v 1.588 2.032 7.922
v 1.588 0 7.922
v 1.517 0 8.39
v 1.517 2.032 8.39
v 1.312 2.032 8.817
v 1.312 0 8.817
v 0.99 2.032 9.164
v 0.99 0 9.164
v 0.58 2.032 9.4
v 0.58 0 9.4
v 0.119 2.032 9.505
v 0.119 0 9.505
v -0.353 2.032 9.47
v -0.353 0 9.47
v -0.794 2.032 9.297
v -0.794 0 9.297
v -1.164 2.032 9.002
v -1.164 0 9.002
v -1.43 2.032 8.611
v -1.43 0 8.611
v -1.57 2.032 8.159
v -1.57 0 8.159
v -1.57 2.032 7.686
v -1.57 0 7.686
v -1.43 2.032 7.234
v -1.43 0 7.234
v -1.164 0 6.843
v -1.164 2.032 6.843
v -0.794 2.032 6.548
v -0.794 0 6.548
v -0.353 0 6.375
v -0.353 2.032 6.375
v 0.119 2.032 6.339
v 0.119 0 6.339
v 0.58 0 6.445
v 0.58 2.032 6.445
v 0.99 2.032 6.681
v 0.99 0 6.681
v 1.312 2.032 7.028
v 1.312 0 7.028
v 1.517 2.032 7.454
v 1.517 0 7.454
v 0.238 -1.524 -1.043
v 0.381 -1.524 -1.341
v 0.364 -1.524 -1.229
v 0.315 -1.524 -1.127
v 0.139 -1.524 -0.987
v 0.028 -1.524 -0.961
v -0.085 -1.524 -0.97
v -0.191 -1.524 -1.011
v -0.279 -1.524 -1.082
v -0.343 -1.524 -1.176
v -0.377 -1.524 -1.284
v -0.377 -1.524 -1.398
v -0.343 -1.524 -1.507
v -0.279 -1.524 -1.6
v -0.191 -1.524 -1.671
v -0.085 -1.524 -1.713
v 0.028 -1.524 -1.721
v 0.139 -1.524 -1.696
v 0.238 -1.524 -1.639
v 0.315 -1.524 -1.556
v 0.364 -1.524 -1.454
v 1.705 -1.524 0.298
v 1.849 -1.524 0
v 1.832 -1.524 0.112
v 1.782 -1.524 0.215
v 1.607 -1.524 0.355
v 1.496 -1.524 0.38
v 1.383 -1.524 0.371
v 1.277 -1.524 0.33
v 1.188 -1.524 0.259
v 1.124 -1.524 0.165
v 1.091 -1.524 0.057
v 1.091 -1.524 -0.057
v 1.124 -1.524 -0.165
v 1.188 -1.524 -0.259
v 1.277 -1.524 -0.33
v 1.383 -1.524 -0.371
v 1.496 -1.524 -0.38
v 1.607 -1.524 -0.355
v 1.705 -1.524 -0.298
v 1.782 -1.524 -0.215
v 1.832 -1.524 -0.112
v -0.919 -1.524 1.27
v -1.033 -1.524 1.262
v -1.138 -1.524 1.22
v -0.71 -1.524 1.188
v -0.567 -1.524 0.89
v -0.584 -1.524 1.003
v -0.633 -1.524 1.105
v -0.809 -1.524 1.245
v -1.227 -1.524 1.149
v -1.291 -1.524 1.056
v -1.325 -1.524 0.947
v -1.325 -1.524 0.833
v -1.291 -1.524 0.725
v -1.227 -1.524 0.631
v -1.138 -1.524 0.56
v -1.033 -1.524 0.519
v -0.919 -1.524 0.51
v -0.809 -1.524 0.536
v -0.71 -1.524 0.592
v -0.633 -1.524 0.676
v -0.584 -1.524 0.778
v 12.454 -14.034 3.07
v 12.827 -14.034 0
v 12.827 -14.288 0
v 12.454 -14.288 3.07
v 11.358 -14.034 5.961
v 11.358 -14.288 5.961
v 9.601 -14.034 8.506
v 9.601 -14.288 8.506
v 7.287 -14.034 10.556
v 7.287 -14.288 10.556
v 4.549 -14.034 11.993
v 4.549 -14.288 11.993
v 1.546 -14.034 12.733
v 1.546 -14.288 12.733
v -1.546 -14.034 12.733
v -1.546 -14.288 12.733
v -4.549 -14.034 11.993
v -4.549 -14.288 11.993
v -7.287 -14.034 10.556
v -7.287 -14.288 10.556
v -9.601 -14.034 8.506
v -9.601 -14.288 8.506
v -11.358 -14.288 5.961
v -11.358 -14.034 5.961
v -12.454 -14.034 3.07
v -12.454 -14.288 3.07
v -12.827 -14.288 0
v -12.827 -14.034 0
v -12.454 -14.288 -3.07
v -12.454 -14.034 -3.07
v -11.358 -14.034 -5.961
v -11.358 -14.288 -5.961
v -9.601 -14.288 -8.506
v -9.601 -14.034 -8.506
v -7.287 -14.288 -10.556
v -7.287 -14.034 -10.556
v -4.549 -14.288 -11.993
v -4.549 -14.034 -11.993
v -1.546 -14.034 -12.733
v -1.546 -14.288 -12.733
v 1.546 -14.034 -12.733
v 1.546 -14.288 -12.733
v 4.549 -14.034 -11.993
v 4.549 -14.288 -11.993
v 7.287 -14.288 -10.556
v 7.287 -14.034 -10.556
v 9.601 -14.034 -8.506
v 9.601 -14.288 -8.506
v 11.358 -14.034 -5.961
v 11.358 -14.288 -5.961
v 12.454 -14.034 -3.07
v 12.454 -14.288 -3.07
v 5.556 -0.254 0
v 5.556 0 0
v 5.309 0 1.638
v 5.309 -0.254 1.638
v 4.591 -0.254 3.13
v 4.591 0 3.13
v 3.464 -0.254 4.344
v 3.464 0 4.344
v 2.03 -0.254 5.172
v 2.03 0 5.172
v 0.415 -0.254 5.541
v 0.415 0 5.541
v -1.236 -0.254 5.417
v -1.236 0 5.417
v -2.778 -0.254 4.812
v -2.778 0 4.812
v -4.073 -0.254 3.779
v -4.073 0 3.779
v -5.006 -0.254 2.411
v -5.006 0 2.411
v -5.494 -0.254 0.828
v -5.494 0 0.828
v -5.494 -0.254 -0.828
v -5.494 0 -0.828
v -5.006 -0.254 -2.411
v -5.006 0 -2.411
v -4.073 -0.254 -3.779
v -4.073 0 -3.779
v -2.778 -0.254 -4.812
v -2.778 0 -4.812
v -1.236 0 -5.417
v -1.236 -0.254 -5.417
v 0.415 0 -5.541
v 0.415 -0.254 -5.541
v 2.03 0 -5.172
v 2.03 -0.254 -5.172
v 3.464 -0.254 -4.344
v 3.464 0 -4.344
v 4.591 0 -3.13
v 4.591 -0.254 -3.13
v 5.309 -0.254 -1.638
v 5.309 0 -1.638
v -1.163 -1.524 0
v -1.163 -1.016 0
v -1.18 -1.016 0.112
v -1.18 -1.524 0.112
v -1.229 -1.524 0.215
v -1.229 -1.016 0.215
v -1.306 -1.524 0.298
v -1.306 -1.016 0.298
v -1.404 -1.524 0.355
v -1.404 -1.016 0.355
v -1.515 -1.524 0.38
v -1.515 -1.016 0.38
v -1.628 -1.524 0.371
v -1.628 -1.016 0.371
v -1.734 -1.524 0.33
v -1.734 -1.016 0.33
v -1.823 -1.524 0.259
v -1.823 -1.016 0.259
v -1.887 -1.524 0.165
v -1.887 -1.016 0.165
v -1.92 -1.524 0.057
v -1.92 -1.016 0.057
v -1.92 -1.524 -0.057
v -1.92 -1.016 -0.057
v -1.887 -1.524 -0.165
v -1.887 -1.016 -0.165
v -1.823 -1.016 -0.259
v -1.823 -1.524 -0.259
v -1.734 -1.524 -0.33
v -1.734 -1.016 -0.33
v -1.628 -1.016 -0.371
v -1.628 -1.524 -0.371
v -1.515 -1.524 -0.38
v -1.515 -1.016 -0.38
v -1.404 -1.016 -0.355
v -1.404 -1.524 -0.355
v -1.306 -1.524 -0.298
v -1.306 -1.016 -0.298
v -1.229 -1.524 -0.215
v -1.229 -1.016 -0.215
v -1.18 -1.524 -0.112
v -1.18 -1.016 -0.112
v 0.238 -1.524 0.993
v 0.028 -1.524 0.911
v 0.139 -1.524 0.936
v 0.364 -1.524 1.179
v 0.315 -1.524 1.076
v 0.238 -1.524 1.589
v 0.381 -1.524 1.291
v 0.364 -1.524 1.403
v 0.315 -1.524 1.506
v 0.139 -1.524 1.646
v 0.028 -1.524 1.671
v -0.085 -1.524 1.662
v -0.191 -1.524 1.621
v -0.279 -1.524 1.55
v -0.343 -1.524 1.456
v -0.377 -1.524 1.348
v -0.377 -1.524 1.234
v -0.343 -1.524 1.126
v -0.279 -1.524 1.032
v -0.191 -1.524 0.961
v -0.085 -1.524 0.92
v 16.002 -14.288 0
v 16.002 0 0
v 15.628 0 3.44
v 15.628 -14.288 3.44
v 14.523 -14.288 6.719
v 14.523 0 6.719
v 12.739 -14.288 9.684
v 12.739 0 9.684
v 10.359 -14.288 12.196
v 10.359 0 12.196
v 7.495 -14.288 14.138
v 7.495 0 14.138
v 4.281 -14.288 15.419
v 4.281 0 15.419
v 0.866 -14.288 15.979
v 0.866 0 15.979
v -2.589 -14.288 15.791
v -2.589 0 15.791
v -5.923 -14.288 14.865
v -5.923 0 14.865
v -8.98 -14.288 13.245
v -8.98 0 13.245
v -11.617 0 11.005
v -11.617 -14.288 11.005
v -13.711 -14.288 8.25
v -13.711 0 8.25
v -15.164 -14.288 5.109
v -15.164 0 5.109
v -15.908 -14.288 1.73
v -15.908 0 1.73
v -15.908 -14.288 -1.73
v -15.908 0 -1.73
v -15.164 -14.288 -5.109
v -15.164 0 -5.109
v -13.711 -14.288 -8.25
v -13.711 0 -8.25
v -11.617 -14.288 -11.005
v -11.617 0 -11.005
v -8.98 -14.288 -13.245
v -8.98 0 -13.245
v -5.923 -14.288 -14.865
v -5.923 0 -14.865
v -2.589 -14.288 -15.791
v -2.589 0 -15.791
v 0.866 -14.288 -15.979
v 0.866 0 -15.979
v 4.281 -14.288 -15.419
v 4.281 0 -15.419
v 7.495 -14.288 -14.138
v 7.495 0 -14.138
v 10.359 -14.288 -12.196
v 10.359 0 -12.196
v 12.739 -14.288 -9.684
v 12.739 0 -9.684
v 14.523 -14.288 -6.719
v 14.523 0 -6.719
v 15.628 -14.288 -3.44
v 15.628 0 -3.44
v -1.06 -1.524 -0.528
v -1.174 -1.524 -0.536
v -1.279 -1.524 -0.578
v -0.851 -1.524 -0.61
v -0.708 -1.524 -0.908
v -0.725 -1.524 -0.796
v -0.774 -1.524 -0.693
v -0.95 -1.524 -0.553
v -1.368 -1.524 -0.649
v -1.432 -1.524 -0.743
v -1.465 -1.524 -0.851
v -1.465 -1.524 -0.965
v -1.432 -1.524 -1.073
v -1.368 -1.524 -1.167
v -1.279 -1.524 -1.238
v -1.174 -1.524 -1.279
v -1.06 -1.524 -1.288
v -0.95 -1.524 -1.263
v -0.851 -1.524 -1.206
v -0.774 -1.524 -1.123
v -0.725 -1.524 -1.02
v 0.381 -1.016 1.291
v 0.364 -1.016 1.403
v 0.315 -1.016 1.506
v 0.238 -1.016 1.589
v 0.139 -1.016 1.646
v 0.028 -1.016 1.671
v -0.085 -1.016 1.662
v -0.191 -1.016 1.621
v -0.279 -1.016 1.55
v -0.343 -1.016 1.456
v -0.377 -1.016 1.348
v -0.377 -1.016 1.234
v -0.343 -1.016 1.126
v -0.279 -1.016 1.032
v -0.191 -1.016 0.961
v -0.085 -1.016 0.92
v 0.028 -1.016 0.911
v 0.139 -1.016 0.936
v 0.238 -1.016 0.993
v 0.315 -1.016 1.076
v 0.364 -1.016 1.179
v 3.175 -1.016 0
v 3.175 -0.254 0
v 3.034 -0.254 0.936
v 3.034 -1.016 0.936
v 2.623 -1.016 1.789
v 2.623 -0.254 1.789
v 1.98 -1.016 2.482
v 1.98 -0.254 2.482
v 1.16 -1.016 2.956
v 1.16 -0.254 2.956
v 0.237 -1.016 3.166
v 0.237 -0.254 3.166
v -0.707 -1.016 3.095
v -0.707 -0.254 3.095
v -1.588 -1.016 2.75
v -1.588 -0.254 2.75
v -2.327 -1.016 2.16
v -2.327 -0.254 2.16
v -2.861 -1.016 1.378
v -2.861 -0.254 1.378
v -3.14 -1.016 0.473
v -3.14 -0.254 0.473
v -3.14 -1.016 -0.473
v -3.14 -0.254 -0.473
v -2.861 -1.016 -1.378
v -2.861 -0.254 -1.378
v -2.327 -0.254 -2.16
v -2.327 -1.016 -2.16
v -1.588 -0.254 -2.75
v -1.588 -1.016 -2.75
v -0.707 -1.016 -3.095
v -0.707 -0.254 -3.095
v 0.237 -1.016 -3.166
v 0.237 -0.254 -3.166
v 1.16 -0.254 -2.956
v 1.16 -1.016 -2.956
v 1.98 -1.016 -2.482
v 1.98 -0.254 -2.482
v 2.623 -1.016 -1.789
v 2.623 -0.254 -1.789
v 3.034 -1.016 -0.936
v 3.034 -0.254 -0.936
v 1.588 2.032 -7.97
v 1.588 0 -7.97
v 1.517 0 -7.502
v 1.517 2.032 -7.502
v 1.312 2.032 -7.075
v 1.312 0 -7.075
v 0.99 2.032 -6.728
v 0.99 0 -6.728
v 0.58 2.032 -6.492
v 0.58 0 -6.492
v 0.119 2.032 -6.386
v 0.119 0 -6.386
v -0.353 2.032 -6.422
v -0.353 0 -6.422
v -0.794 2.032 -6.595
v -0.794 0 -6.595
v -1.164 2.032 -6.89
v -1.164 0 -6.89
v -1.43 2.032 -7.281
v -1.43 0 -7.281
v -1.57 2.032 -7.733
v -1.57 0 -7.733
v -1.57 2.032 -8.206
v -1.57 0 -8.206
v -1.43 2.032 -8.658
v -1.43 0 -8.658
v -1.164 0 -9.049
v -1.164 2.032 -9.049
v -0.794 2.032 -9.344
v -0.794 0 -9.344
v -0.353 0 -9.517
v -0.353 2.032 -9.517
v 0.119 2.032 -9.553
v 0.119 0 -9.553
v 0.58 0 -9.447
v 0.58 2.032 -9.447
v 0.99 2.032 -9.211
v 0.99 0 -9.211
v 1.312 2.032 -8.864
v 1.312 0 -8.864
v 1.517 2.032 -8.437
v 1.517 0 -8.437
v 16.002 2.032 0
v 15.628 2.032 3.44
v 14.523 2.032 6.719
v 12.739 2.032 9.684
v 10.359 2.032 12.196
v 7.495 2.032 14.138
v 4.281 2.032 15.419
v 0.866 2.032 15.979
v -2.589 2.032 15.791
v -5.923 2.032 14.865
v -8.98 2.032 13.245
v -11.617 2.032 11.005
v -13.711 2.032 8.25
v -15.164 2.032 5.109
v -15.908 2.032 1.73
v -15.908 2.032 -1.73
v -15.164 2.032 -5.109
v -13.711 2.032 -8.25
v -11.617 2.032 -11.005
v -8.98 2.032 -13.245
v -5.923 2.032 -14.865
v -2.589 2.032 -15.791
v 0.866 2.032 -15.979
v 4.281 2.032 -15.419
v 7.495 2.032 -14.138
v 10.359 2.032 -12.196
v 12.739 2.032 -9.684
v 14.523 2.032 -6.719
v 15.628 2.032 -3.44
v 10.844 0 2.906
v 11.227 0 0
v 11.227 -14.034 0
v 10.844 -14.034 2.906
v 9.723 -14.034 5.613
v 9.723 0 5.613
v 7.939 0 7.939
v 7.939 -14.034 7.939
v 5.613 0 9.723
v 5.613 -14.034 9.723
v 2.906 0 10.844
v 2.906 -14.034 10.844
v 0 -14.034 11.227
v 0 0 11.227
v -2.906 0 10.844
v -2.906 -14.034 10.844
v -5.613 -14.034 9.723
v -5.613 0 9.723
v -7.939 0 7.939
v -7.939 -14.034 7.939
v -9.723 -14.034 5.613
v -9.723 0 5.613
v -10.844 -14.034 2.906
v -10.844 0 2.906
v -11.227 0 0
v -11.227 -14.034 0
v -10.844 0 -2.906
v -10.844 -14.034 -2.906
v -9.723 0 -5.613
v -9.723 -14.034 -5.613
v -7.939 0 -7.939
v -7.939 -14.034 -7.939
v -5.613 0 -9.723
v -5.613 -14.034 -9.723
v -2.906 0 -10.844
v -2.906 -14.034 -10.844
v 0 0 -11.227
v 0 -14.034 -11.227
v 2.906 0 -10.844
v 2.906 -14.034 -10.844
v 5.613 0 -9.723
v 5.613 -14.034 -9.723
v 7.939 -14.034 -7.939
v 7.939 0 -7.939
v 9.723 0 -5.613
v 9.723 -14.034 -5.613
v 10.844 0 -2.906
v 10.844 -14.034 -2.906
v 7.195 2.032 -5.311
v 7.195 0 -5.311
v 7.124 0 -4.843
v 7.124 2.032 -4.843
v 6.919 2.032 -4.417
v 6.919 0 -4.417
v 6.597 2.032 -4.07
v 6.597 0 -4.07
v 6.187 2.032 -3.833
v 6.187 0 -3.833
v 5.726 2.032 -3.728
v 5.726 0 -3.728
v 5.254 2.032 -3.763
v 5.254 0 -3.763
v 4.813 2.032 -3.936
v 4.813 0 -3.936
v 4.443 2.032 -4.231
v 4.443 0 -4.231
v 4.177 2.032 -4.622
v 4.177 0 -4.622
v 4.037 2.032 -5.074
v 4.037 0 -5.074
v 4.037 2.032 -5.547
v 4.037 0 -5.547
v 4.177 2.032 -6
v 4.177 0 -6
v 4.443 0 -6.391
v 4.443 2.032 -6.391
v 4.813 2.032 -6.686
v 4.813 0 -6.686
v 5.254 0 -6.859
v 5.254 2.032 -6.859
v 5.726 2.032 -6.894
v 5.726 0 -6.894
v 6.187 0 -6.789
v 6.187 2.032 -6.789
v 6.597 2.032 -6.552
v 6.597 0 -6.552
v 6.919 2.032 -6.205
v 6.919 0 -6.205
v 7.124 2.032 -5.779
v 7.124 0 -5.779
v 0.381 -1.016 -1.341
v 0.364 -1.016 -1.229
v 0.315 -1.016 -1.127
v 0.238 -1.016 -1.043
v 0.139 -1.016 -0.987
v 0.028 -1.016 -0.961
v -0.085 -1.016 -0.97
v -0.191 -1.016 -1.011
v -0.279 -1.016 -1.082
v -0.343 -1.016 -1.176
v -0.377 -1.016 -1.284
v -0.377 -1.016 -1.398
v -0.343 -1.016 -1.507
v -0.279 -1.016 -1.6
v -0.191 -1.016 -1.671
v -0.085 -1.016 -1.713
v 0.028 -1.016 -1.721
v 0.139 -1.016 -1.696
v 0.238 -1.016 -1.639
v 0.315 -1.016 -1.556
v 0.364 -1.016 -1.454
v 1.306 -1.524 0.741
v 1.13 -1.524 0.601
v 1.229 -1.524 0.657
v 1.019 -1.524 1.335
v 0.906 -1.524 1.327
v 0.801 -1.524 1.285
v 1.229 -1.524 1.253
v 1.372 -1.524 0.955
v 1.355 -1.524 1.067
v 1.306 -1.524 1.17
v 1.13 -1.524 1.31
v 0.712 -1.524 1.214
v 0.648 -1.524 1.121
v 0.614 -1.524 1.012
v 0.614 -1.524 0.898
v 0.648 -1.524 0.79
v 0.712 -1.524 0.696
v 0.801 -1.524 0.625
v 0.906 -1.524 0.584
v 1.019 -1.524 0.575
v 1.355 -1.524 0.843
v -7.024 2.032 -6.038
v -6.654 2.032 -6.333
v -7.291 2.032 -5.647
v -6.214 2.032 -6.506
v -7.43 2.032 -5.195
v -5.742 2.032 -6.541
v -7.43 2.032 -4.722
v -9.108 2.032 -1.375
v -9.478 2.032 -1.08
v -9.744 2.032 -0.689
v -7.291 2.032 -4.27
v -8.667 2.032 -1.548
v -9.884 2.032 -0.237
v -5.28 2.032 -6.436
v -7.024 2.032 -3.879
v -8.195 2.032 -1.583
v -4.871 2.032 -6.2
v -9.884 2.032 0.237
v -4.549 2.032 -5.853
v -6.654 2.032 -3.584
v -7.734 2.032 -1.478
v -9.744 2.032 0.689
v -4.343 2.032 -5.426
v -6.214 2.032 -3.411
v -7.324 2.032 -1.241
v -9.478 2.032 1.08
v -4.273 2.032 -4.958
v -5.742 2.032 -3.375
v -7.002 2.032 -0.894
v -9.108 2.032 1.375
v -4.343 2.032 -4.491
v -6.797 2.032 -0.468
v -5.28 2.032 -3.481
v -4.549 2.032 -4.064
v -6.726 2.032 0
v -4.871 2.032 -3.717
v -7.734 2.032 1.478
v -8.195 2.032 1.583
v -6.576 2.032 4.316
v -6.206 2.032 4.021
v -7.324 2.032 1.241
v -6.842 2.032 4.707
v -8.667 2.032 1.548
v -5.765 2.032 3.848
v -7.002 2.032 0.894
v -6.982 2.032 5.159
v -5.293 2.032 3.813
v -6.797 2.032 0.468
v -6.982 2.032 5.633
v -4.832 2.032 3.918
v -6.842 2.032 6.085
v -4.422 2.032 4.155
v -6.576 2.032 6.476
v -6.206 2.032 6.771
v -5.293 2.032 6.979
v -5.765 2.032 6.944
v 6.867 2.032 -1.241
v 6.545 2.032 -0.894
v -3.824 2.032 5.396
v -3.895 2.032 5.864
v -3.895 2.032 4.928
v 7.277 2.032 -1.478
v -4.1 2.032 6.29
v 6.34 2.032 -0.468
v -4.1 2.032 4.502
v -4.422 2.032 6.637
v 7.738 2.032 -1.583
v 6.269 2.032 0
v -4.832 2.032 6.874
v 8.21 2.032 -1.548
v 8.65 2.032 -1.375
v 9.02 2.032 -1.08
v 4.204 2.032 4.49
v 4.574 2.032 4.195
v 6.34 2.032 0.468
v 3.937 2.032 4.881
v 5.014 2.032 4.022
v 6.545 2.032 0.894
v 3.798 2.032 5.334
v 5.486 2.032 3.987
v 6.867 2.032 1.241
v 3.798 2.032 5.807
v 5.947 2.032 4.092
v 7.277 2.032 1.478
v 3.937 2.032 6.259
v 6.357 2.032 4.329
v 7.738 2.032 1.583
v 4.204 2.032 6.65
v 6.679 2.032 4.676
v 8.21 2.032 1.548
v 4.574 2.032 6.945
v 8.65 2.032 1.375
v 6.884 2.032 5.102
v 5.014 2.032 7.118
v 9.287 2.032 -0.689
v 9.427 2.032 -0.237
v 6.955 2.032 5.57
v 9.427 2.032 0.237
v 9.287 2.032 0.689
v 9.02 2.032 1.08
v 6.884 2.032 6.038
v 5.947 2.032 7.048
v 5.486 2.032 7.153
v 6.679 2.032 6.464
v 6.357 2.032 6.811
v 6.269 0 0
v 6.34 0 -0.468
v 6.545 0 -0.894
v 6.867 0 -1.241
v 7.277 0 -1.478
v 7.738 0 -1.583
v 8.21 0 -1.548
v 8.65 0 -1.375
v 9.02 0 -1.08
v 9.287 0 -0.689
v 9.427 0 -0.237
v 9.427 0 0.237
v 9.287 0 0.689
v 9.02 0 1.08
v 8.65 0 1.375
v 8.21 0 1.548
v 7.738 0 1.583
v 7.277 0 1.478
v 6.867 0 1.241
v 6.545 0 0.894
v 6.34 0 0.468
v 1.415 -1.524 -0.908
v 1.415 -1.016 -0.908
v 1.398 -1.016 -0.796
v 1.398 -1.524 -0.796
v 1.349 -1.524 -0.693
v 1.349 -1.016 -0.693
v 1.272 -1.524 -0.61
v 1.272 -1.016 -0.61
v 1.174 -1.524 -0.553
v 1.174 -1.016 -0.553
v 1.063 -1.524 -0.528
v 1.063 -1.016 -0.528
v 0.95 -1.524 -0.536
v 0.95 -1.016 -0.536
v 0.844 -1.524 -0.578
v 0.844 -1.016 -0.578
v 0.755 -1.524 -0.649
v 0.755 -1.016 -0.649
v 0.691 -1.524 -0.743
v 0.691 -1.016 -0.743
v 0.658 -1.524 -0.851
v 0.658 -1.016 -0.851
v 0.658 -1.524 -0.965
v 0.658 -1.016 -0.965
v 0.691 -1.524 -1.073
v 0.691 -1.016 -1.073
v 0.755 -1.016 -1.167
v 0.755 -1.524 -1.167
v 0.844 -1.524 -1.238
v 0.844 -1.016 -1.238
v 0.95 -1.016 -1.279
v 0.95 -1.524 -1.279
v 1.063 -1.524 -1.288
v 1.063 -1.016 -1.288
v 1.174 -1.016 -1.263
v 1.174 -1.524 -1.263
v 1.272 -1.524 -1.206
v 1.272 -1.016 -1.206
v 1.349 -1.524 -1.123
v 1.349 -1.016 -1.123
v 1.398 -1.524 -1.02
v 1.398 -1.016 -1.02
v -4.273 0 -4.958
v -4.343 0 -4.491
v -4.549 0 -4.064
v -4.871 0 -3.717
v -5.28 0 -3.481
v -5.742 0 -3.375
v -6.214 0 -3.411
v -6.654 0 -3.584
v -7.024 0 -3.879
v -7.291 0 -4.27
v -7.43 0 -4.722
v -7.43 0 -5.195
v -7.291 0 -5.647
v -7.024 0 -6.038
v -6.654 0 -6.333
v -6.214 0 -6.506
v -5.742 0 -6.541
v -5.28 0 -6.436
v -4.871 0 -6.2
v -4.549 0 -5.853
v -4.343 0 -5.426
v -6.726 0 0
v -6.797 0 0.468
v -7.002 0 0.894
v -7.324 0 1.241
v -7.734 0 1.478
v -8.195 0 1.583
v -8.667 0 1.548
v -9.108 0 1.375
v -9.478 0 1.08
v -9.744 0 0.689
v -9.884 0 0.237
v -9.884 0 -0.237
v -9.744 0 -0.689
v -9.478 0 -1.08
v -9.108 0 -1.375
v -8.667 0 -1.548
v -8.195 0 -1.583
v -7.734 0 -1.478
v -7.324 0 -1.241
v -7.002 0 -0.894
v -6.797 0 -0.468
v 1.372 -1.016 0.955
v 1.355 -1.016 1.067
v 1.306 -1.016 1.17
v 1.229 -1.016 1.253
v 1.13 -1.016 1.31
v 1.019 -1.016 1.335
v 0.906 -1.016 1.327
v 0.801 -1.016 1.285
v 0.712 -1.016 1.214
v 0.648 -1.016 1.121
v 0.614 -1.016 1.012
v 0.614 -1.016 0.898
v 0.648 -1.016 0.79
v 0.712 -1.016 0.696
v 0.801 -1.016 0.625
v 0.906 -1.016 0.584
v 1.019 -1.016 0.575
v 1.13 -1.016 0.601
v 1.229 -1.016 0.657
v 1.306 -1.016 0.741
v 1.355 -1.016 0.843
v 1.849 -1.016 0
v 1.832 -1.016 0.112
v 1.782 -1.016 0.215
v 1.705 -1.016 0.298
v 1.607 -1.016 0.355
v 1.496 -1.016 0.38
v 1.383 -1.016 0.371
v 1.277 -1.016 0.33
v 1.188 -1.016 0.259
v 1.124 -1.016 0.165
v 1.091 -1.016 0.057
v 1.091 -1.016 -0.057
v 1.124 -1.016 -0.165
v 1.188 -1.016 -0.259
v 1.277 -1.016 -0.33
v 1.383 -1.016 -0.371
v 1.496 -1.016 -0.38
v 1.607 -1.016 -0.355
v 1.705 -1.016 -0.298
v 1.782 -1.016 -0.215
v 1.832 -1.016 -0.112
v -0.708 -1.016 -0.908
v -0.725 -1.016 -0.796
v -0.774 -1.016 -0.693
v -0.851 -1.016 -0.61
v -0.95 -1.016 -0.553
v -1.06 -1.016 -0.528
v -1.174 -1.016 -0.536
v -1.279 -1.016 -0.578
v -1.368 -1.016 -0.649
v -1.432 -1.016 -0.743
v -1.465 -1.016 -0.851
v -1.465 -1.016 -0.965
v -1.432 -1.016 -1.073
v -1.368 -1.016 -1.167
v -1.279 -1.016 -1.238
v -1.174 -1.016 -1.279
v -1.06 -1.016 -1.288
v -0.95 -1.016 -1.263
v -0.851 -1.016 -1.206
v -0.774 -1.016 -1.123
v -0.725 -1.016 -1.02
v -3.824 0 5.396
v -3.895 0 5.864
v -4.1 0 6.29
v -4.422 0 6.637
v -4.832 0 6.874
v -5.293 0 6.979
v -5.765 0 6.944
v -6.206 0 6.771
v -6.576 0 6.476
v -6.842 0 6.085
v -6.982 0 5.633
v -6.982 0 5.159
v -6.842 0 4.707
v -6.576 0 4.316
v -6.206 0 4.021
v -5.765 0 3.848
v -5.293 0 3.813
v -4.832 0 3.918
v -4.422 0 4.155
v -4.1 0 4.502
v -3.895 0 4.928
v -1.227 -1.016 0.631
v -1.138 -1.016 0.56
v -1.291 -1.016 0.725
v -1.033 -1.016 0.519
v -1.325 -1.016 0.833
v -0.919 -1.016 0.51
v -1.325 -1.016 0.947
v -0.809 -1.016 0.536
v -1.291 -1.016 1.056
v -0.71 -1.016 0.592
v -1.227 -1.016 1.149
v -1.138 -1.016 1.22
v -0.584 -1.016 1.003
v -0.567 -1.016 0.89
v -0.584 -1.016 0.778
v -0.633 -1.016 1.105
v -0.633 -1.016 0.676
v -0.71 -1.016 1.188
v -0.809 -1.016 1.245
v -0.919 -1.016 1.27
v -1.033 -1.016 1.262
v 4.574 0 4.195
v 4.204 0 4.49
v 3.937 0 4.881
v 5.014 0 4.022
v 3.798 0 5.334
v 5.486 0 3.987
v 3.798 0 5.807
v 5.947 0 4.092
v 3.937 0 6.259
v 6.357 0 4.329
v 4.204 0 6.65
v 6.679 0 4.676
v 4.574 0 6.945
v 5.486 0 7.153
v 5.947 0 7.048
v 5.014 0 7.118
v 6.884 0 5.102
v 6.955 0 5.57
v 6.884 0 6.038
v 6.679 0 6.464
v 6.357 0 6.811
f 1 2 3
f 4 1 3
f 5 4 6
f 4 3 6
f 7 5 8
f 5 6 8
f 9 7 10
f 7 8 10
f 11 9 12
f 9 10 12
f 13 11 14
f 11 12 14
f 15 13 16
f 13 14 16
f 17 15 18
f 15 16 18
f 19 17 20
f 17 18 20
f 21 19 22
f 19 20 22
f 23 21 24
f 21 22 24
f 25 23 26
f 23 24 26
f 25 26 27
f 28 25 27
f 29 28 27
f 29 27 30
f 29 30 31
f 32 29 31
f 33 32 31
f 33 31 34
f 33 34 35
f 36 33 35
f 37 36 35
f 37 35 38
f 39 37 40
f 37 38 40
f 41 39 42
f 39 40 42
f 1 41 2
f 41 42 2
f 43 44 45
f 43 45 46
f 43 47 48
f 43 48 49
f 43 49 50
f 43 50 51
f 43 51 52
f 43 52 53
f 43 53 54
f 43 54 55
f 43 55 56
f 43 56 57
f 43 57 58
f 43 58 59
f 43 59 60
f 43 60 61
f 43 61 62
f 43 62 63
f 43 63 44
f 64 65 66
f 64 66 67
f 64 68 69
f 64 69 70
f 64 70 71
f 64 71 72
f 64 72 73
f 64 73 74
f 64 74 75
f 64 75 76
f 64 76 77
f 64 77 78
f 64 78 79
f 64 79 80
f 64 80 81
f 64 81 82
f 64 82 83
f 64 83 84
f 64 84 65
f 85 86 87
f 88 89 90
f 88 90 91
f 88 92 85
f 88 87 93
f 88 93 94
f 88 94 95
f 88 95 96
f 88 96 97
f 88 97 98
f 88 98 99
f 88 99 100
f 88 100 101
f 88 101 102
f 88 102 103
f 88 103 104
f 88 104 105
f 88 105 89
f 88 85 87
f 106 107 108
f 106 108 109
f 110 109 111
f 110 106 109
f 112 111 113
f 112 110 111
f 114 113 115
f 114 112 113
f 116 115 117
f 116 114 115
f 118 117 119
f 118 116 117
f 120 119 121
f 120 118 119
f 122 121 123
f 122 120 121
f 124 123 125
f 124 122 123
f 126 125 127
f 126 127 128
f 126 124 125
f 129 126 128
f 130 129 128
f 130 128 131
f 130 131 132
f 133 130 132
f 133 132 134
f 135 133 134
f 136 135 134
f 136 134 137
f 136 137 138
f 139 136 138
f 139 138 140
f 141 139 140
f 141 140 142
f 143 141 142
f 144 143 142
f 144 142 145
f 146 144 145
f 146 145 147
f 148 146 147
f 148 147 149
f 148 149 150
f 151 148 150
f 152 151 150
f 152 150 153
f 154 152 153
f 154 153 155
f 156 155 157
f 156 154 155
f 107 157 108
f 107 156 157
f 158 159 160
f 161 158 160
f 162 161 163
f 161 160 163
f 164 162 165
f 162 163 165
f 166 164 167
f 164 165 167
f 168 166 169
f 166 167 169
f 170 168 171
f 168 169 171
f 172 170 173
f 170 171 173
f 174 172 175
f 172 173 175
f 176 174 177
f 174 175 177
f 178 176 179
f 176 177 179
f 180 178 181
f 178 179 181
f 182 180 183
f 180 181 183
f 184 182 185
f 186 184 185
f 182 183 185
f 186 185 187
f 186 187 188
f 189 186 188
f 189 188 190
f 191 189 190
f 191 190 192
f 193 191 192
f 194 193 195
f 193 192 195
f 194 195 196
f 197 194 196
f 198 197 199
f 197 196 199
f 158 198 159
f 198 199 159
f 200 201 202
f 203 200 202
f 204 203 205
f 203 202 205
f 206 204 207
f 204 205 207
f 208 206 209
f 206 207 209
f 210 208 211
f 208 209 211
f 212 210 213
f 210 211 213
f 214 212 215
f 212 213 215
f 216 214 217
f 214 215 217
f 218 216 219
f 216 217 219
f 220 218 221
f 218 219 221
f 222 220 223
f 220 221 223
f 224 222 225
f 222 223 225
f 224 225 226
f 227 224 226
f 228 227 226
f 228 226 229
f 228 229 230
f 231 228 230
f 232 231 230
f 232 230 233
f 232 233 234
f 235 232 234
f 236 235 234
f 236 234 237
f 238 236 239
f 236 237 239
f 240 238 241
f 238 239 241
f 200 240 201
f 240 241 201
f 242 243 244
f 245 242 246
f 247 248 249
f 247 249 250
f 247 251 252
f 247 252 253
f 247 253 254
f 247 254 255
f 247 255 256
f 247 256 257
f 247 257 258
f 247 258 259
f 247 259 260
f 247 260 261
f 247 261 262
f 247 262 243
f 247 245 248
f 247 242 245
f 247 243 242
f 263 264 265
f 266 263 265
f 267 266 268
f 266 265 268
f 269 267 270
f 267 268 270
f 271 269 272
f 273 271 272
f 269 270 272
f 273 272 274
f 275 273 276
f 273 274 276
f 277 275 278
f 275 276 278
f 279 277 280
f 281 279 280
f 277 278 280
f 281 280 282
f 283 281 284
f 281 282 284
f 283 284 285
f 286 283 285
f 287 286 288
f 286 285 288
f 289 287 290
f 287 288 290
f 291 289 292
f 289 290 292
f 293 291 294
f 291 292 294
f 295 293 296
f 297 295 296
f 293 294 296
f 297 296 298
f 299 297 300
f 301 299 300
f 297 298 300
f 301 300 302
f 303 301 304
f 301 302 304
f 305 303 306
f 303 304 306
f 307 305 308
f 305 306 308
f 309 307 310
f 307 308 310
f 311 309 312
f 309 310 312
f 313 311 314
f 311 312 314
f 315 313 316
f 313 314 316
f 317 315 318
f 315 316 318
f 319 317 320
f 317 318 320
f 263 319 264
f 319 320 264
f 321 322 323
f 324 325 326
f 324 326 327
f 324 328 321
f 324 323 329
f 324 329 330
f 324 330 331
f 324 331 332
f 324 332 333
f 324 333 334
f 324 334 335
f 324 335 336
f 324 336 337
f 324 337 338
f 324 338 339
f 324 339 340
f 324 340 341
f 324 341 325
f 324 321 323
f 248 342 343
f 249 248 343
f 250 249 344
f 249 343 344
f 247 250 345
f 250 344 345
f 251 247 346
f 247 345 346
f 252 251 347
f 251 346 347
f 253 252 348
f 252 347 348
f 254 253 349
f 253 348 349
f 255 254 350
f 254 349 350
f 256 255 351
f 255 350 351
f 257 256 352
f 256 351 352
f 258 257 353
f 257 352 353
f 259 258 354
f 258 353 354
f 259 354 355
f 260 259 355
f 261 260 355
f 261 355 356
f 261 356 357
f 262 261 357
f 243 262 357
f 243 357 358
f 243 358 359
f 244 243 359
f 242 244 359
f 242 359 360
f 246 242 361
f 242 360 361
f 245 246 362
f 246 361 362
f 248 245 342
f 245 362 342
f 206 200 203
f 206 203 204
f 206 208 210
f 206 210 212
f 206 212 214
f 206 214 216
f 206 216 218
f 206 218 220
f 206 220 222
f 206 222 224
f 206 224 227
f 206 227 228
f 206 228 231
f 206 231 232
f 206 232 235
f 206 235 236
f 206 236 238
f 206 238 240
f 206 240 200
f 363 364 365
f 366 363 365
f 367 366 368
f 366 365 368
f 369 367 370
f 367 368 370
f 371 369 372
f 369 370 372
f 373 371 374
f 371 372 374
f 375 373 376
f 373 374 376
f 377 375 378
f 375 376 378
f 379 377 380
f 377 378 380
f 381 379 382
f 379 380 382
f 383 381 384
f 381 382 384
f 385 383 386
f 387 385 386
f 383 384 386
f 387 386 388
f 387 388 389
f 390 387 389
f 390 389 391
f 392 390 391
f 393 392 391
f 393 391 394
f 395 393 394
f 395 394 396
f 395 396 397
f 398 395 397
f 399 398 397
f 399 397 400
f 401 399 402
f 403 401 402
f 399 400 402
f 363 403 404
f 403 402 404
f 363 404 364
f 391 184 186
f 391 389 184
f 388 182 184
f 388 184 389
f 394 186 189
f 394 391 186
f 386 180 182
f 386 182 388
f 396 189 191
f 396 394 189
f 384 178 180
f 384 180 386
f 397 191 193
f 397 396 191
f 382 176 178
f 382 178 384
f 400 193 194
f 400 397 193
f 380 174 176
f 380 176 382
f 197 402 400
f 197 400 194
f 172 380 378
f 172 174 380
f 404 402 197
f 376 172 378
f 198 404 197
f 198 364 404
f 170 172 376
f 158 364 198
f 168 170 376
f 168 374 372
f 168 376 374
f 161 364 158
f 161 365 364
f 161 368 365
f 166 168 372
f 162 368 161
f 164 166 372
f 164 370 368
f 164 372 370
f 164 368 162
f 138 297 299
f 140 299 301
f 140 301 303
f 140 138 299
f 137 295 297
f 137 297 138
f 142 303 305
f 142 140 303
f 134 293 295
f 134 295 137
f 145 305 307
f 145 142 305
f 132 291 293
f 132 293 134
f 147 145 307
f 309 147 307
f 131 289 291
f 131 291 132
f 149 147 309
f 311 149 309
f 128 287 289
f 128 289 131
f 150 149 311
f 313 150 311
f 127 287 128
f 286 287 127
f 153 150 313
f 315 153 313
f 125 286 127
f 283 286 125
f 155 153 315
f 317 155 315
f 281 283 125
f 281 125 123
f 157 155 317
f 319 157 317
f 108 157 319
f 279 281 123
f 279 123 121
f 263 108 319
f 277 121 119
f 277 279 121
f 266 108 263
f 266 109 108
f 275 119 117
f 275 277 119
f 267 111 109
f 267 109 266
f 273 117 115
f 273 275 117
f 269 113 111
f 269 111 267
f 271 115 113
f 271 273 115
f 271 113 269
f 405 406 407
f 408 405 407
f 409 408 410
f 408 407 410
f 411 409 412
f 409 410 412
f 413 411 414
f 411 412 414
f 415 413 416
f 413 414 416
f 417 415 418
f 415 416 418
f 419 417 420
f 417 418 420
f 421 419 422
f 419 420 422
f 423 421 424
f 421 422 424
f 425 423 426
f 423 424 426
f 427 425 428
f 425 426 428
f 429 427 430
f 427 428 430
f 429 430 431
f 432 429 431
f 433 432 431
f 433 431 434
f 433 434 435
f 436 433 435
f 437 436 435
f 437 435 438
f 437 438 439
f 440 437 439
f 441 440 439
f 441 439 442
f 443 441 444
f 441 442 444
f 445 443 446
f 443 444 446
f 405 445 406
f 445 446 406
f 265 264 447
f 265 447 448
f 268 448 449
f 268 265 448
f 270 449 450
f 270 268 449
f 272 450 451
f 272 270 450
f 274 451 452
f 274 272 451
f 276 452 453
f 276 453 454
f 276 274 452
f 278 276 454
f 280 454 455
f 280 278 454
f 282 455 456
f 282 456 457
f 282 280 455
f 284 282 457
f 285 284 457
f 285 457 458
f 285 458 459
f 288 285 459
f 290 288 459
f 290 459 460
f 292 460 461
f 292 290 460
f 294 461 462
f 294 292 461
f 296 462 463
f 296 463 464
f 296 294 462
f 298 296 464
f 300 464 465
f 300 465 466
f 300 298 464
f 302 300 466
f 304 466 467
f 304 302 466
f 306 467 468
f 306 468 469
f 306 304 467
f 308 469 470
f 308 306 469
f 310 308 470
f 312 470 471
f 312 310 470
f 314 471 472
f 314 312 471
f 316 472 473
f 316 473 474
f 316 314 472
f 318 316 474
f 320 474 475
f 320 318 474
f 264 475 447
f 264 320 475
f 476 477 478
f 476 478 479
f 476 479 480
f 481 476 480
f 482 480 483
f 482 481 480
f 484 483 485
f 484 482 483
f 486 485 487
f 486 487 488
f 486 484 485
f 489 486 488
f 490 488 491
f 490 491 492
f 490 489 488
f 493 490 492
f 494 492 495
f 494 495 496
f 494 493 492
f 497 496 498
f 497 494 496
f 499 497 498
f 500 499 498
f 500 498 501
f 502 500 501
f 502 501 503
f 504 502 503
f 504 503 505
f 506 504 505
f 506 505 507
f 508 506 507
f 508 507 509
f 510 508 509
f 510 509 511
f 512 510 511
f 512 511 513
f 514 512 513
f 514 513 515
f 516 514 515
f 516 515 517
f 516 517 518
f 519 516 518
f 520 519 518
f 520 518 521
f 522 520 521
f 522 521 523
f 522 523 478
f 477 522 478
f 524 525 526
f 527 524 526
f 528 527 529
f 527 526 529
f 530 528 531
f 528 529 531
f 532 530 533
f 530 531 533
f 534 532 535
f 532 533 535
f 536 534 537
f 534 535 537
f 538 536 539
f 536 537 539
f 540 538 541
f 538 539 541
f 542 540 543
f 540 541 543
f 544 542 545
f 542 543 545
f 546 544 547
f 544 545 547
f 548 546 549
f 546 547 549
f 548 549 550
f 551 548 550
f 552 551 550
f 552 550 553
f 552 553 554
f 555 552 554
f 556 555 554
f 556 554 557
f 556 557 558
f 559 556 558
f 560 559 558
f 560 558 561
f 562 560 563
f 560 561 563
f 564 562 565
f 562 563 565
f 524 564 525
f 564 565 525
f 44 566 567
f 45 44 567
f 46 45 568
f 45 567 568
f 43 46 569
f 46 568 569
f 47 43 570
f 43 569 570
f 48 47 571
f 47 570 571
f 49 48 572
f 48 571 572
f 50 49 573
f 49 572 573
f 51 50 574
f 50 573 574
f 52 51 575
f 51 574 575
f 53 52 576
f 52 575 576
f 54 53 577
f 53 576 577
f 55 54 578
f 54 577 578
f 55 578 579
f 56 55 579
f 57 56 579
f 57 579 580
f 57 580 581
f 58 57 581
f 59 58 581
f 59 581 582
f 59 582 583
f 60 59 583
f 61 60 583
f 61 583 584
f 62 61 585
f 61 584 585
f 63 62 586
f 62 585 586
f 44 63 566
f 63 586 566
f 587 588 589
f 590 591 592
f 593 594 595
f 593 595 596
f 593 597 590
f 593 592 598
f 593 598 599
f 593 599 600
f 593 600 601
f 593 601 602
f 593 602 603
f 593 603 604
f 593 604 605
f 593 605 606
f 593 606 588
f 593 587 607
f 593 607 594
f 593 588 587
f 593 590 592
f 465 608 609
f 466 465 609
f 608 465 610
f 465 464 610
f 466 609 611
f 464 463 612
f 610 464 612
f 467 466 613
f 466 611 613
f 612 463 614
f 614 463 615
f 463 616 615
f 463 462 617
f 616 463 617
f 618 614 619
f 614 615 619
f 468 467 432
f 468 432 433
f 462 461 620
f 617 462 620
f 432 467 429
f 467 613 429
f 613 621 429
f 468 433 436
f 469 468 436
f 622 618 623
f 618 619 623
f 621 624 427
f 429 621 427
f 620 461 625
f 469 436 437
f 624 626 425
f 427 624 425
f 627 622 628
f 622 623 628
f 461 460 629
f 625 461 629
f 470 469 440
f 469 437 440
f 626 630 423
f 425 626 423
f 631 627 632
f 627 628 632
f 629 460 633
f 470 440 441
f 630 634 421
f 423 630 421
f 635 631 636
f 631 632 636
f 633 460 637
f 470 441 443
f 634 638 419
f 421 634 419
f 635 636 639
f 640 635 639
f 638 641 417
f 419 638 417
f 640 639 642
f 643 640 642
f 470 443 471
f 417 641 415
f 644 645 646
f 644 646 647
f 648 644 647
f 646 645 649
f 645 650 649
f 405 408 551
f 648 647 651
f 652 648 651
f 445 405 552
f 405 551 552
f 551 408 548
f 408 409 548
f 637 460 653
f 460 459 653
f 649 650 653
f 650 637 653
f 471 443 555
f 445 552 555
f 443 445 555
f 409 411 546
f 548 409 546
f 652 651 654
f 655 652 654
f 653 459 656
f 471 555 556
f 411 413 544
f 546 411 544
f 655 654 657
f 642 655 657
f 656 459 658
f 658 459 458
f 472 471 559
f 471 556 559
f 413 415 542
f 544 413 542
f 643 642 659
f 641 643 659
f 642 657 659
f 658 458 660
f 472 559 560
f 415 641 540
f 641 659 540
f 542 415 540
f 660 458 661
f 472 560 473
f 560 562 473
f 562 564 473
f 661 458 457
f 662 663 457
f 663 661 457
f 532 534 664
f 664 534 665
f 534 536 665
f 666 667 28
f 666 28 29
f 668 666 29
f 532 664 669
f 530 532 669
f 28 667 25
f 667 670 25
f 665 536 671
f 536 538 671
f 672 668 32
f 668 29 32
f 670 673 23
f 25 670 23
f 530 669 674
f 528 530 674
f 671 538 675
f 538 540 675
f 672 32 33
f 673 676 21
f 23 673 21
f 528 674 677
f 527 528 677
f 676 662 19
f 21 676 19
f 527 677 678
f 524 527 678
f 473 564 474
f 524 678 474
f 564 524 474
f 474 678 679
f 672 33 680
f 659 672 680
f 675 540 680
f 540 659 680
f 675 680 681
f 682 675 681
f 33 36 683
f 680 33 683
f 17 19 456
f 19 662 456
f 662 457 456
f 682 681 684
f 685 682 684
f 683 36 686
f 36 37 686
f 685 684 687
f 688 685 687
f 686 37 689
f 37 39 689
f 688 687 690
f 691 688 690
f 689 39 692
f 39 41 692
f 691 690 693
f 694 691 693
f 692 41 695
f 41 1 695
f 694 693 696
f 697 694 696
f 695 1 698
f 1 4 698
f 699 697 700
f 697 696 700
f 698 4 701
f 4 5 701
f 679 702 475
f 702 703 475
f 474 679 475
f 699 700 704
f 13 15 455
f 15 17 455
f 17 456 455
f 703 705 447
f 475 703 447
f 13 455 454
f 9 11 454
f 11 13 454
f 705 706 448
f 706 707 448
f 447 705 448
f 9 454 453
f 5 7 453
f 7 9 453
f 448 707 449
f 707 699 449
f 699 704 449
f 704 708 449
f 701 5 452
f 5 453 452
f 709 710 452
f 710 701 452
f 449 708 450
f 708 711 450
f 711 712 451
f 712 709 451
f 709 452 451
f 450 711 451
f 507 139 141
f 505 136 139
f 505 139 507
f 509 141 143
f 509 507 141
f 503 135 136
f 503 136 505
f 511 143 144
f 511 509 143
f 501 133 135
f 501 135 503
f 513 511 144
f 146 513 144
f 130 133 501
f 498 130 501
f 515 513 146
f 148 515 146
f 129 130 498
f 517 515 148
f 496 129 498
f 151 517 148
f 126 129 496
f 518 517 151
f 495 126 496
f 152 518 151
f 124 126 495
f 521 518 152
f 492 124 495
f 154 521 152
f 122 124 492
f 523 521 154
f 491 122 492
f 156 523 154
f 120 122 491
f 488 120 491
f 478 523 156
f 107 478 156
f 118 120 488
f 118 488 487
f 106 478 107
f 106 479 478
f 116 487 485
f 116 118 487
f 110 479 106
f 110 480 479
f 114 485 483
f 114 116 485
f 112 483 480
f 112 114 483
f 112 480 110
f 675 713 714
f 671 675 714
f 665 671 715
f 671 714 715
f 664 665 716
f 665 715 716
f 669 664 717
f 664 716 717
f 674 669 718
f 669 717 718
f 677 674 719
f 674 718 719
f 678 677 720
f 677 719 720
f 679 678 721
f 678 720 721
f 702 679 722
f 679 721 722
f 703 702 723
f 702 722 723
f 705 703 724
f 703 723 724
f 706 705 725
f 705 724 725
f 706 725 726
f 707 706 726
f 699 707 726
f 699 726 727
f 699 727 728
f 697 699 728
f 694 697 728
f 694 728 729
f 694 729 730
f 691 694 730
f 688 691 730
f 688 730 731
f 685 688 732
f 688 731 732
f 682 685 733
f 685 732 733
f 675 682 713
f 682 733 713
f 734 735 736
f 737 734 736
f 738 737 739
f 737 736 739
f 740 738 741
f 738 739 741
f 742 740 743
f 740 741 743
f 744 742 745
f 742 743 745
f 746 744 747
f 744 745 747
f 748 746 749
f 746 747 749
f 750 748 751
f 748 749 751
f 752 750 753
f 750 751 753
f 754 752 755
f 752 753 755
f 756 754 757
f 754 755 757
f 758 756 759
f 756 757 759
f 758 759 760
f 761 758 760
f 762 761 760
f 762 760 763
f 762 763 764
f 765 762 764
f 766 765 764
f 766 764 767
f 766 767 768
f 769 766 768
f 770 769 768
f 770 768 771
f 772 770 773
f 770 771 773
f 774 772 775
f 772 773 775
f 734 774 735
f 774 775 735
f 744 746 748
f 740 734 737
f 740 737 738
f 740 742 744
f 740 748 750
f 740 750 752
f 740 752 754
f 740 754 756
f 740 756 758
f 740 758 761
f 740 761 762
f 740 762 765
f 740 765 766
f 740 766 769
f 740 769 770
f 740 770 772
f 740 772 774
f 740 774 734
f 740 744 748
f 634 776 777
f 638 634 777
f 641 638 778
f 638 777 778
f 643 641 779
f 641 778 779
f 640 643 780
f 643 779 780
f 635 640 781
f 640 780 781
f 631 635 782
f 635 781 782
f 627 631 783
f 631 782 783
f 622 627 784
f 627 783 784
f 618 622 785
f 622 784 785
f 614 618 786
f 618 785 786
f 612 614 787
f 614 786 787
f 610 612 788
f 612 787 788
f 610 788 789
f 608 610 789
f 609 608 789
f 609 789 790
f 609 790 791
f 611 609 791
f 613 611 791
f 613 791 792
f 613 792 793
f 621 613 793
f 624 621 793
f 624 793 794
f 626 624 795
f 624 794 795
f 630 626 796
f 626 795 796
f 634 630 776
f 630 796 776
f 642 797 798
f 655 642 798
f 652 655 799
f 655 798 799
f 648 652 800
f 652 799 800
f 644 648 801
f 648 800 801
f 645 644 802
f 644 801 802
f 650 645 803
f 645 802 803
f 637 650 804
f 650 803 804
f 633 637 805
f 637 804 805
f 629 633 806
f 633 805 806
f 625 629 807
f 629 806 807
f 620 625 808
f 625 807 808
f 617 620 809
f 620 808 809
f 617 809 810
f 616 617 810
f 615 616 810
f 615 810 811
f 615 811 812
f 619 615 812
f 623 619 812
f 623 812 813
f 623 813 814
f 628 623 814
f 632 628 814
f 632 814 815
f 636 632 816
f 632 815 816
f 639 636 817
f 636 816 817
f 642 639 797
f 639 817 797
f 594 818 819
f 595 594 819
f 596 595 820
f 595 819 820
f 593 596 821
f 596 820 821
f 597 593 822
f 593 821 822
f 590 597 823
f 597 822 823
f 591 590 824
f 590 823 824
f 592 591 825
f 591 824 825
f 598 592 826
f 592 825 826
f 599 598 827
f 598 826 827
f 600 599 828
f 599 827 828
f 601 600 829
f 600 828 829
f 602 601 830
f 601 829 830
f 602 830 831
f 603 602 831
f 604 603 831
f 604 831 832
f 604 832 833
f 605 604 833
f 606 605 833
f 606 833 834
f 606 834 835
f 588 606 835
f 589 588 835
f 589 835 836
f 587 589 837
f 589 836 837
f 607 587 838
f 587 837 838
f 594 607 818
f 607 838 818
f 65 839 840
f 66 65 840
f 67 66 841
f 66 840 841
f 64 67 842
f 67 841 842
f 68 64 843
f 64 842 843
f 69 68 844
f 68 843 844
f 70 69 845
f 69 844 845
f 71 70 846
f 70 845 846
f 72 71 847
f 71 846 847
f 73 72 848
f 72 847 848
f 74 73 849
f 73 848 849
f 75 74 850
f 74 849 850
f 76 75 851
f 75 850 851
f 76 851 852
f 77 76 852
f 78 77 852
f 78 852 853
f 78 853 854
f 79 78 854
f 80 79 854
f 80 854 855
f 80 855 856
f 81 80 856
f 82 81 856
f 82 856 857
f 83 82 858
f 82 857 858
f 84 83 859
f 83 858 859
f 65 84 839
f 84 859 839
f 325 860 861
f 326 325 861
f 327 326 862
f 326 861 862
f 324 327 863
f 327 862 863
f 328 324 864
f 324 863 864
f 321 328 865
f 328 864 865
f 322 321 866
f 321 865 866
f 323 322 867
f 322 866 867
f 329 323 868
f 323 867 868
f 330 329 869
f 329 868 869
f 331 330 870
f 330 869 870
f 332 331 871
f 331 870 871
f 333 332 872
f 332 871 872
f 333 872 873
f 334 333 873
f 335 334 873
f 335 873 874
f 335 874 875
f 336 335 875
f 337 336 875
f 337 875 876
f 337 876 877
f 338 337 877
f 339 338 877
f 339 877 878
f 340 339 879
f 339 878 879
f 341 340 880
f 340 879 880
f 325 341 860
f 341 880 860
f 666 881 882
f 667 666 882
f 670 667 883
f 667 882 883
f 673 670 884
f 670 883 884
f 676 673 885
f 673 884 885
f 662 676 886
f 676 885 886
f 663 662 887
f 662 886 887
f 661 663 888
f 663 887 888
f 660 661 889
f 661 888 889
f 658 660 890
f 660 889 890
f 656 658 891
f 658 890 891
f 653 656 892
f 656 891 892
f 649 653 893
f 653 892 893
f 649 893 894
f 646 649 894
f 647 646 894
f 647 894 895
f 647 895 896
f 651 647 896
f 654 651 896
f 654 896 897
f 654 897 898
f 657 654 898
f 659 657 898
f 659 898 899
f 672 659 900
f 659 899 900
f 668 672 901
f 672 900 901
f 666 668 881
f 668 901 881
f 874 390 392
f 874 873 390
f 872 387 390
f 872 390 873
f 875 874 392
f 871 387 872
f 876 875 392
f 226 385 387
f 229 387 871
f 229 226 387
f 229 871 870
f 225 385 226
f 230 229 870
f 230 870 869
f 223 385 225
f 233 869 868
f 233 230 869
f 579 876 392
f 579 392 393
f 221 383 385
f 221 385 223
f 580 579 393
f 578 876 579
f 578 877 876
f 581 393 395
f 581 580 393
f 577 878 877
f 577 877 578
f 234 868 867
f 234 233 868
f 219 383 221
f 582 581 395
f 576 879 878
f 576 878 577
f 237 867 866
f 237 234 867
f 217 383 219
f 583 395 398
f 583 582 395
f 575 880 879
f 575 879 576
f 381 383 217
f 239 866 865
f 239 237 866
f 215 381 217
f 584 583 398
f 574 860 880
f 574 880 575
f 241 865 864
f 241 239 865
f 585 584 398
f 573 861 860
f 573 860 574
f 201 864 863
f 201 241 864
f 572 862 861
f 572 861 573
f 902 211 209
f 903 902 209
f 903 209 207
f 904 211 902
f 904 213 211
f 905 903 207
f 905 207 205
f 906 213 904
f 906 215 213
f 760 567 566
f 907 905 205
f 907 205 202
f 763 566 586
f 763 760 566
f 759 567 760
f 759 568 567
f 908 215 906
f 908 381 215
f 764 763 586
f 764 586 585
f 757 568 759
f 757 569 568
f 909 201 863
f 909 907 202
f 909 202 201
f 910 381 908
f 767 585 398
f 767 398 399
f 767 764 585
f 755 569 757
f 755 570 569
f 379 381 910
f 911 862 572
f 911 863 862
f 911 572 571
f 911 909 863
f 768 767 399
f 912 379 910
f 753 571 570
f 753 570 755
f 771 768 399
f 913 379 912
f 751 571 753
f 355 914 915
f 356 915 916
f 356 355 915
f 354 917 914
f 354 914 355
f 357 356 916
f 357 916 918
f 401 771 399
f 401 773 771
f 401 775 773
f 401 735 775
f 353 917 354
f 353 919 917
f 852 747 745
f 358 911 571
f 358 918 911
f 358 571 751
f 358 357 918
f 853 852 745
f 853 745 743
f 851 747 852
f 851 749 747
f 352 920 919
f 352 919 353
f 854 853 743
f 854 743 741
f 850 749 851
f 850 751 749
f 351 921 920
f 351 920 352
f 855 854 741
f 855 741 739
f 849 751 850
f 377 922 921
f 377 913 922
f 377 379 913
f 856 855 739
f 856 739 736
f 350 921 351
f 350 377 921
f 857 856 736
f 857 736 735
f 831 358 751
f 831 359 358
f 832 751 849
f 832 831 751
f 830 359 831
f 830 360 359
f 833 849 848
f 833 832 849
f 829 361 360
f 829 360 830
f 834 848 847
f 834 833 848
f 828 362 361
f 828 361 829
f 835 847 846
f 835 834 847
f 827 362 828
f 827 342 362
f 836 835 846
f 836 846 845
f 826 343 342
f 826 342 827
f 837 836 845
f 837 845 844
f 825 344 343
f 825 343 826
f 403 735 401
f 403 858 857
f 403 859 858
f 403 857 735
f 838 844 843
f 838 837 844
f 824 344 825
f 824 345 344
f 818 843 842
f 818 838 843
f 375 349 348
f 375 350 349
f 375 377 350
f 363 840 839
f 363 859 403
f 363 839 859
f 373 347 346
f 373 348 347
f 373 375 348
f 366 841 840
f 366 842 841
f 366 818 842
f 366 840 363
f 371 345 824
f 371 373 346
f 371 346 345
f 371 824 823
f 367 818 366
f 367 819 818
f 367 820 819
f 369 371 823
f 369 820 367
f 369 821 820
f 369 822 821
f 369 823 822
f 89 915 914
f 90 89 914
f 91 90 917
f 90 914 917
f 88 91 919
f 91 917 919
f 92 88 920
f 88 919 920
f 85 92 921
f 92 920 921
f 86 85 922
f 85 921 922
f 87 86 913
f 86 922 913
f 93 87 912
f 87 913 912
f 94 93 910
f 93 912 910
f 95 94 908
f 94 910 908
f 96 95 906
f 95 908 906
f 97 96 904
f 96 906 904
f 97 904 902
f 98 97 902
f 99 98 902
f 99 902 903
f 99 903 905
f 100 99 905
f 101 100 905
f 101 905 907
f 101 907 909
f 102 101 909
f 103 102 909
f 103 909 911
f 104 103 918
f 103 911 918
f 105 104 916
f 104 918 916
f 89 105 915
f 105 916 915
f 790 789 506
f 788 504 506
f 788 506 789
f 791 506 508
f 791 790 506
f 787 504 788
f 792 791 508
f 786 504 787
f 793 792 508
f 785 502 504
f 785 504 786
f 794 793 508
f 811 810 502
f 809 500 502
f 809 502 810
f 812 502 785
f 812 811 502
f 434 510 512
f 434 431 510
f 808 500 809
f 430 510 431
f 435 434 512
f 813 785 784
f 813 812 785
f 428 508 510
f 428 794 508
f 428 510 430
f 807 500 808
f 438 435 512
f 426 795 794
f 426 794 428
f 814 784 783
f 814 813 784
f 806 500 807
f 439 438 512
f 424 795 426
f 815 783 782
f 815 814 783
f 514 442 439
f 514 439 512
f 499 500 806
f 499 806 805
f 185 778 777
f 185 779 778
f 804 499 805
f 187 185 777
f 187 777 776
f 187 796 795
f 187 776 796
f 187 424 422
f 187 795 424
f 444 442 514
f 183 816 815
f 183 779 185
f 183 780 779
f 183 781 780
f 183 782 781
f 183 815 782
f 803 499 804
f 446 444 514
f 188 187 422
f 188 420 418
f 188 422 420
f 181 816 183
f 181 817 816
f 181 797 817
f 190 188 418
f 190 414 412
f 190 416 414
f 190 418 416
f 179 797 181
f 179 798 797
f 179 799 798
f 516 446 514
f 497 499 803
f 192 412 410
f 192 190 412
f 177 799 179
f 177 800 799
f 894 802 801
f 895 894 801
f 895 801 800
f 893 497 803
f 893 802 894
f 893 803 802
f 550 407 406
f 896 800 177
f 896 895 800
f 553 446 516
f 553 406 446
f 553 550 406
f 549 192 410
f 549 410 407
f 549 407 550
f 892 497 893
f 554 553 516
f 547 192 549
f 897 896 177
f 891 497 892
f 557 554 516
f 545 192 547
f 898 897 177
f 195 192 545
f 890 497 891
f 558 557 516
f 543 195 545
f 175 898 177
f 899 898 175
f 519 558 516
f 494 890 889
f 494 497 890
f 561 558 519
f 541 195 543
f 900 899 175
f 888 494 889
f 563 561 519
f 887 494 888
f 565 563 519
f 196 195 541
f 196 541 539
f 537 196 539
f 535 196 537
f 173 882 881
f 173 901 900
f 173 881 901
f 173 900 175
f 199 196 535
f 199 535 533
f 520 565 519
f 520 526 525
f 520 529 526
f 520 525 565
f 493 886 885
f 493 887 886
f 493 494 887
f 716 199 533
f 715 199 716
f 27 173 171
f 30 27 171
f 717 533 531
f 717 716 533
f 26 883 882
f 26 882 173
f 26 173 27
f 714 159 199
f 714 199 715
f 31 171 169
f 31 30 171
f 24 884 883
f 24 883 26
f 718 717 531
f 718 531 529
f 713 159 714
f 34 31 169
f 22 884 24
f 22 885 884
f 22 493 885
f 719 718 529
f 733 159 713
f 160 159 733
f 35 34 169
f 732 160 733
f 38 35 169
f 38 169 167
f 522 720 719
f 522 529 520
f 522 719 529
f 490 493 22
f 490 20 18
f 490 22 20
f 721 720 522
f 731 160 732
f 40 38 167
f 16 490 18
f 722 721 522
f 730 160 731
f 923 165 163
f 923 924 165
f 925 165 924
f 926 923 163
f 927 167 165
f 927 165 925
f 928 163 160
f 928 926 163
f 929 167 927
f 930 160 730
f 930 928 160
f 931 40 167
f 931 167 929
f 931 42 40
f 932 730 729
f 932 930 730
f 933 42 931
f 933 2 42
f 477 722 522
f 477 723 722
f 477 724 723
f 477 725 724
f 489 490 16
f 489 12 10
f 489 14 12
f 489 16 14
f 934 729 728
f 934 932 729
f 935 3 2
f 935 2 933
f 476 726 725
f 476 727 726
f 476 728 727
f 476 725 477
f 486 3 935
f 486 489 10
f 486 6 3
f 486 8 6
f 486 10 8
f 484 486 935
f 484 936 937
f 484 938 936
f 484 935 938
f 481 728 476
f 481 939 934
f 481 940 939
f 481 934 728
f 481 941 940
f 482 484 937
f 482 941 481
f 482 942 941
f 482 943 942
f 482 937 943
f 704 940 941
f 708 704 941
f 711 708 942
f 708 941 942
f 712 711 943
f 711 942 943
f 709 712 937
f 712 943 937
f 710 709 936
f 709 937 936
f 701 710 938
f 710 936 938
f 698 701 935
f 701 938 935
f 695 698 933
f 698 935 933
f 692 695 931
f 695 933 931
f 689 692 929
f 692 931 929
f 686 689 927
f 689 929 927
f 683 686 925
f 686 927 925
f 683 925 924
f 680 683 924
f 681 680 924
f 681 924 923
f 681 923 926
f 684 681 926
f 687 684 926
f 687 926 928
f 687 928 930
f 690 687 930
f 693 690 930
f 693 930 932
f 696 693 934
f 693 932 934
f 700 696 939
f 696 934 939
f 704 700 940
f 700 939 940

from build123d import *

# Parameters (mm, degrees)
F0_R      = 16.002
F1_DEPTH  = 2.032
F3_R      = 12.827
F3_R_2    = 11.2268
F4_DEPTH  = 0.254
F2_R      = 1.5875
F5_DEPTH  = 2.032
F6_R      = 5.55625
F7_DEPTH  = 0.254
F8_R      = 3.175
F9_DEPTH  = 0.762
F10_R     = 0.381
F11_DEPTH = 0.508
F12_DEPTH = 14.2875


with BuildPart() as f1:
    # F0 (on Front) → F1 (new body)
    with BuildSketch(Plane.XZ):
        Circle(F0_R)
    extrude(amount=-F1_DEPTH)

    # F3 (on face) → F4 (cut)
    with BuildSketch(Plane.XZ):
        Circle(F3_R)
        Circle(F3_R_2, mode=Mode.SUBTRACT)
    extrude(amount=-F4_DEPTH, mode=Mode.SUBTRACT)

    # F2 (on face) → F5 (cut)
    with BuildSketch(Plane.XZ):
        with Locations((0, -7.9695228487)):
            Circle(F2_R)
        with Locations((-5.8604669757, -4.9584284425)):
            Circle(F2_R)
        with BuildLine():
            Line((-6.7264510825, 0), (-9.9014510825, 0))
            ThreePointArc((-9.9014510825, 0), (-8.3139510825, -1.5875), (-6.7264510825, 0))
        make_face()
        with BuildLine():
            ThreePointArc((-6.7264510825, 0), (-8.3139510825, 1.5875), (-9.9014510825, 0))
            Line((-9.9014510825, 0), (-6.7264510825, 0))
        make_face()
        with Locations((-5.4118158296, 5.3960969672)):
            Circle(F2_R)
        with Locations((0, 7.9223643988)):
            Circle(F2_R)
        with Locations((5.3672702052, 5.5701895617)):
            Circle(F2_R)
        with BuildLine():
            Line((6.2692415476, 0), (9.4442415476, 0))
            ThreePointArc((9.4442415476, 0), (7.8567415476, 1.5875), (6.2692415476, 0))
        make_face()
        with BuildLine():
            ThreePointArc((6.2692415476, 0), (7.8567415476, -1.5875), (9.4442415476, 0))
            Line((9.4442415476, 0), (6.2692415476, 0))
        make_face()
        with Locations((5.607039202, -5.3108036518)):
            Circle(F2_R)
    extrude(amount=-F5_DEPTH, mode=Mode.SUBTRACT)

    # F6 (on face) → F7 (join)
    with BuildSketch(Plane.XZ):
        Circle(F6_R)
    extrude(amount=F7_DEPTH)

    # F8 (on face) → F9 (join)
    with BuildSketch(Plane.XZ.offset(0.254)):
        Circle(F8_R)
    extrude(amount=F9_DEPTH)

    # F10 (on face) → F11 (join)
    with BuildSketch(Plane.XZ.offset(1.016)):
        with Locations((-1.543693963, 0)):
            Circle(F10_R)
        with Locations((-0.9479312136, 0.8902023229)):
            Circle(F10_R)
        with Locations((0, 1.2909881785)):
            Circle(F10_R)
        with Locations((0.9910054901, 0.9551946484)):
            Circle(F10_R)
        with Locations((1.4676158223, 0)):
            Circle(F10_R)
        with Locations((1.0343337624, -0.9079179104)):
            Circle(F10_R)
        with Locations((0, -1.3411998874)):
            Circle(F10_R)
        with Locations((-1.0887479328, -0.9079179104)):
            Circle(F10_R)
    extrude(amount=F11_DEPTH)

    # F12 (add): faces of the model
    f12_faces = [f1.faces().sort_by_distance(p)[0] for p in [
        (-15.5493950915, 0, 0),
        (-12.4641976527, 0.254, 0),
    ]]
    extrude(f12_faces, amount=F12_DEPTH)


solid = f1.part
